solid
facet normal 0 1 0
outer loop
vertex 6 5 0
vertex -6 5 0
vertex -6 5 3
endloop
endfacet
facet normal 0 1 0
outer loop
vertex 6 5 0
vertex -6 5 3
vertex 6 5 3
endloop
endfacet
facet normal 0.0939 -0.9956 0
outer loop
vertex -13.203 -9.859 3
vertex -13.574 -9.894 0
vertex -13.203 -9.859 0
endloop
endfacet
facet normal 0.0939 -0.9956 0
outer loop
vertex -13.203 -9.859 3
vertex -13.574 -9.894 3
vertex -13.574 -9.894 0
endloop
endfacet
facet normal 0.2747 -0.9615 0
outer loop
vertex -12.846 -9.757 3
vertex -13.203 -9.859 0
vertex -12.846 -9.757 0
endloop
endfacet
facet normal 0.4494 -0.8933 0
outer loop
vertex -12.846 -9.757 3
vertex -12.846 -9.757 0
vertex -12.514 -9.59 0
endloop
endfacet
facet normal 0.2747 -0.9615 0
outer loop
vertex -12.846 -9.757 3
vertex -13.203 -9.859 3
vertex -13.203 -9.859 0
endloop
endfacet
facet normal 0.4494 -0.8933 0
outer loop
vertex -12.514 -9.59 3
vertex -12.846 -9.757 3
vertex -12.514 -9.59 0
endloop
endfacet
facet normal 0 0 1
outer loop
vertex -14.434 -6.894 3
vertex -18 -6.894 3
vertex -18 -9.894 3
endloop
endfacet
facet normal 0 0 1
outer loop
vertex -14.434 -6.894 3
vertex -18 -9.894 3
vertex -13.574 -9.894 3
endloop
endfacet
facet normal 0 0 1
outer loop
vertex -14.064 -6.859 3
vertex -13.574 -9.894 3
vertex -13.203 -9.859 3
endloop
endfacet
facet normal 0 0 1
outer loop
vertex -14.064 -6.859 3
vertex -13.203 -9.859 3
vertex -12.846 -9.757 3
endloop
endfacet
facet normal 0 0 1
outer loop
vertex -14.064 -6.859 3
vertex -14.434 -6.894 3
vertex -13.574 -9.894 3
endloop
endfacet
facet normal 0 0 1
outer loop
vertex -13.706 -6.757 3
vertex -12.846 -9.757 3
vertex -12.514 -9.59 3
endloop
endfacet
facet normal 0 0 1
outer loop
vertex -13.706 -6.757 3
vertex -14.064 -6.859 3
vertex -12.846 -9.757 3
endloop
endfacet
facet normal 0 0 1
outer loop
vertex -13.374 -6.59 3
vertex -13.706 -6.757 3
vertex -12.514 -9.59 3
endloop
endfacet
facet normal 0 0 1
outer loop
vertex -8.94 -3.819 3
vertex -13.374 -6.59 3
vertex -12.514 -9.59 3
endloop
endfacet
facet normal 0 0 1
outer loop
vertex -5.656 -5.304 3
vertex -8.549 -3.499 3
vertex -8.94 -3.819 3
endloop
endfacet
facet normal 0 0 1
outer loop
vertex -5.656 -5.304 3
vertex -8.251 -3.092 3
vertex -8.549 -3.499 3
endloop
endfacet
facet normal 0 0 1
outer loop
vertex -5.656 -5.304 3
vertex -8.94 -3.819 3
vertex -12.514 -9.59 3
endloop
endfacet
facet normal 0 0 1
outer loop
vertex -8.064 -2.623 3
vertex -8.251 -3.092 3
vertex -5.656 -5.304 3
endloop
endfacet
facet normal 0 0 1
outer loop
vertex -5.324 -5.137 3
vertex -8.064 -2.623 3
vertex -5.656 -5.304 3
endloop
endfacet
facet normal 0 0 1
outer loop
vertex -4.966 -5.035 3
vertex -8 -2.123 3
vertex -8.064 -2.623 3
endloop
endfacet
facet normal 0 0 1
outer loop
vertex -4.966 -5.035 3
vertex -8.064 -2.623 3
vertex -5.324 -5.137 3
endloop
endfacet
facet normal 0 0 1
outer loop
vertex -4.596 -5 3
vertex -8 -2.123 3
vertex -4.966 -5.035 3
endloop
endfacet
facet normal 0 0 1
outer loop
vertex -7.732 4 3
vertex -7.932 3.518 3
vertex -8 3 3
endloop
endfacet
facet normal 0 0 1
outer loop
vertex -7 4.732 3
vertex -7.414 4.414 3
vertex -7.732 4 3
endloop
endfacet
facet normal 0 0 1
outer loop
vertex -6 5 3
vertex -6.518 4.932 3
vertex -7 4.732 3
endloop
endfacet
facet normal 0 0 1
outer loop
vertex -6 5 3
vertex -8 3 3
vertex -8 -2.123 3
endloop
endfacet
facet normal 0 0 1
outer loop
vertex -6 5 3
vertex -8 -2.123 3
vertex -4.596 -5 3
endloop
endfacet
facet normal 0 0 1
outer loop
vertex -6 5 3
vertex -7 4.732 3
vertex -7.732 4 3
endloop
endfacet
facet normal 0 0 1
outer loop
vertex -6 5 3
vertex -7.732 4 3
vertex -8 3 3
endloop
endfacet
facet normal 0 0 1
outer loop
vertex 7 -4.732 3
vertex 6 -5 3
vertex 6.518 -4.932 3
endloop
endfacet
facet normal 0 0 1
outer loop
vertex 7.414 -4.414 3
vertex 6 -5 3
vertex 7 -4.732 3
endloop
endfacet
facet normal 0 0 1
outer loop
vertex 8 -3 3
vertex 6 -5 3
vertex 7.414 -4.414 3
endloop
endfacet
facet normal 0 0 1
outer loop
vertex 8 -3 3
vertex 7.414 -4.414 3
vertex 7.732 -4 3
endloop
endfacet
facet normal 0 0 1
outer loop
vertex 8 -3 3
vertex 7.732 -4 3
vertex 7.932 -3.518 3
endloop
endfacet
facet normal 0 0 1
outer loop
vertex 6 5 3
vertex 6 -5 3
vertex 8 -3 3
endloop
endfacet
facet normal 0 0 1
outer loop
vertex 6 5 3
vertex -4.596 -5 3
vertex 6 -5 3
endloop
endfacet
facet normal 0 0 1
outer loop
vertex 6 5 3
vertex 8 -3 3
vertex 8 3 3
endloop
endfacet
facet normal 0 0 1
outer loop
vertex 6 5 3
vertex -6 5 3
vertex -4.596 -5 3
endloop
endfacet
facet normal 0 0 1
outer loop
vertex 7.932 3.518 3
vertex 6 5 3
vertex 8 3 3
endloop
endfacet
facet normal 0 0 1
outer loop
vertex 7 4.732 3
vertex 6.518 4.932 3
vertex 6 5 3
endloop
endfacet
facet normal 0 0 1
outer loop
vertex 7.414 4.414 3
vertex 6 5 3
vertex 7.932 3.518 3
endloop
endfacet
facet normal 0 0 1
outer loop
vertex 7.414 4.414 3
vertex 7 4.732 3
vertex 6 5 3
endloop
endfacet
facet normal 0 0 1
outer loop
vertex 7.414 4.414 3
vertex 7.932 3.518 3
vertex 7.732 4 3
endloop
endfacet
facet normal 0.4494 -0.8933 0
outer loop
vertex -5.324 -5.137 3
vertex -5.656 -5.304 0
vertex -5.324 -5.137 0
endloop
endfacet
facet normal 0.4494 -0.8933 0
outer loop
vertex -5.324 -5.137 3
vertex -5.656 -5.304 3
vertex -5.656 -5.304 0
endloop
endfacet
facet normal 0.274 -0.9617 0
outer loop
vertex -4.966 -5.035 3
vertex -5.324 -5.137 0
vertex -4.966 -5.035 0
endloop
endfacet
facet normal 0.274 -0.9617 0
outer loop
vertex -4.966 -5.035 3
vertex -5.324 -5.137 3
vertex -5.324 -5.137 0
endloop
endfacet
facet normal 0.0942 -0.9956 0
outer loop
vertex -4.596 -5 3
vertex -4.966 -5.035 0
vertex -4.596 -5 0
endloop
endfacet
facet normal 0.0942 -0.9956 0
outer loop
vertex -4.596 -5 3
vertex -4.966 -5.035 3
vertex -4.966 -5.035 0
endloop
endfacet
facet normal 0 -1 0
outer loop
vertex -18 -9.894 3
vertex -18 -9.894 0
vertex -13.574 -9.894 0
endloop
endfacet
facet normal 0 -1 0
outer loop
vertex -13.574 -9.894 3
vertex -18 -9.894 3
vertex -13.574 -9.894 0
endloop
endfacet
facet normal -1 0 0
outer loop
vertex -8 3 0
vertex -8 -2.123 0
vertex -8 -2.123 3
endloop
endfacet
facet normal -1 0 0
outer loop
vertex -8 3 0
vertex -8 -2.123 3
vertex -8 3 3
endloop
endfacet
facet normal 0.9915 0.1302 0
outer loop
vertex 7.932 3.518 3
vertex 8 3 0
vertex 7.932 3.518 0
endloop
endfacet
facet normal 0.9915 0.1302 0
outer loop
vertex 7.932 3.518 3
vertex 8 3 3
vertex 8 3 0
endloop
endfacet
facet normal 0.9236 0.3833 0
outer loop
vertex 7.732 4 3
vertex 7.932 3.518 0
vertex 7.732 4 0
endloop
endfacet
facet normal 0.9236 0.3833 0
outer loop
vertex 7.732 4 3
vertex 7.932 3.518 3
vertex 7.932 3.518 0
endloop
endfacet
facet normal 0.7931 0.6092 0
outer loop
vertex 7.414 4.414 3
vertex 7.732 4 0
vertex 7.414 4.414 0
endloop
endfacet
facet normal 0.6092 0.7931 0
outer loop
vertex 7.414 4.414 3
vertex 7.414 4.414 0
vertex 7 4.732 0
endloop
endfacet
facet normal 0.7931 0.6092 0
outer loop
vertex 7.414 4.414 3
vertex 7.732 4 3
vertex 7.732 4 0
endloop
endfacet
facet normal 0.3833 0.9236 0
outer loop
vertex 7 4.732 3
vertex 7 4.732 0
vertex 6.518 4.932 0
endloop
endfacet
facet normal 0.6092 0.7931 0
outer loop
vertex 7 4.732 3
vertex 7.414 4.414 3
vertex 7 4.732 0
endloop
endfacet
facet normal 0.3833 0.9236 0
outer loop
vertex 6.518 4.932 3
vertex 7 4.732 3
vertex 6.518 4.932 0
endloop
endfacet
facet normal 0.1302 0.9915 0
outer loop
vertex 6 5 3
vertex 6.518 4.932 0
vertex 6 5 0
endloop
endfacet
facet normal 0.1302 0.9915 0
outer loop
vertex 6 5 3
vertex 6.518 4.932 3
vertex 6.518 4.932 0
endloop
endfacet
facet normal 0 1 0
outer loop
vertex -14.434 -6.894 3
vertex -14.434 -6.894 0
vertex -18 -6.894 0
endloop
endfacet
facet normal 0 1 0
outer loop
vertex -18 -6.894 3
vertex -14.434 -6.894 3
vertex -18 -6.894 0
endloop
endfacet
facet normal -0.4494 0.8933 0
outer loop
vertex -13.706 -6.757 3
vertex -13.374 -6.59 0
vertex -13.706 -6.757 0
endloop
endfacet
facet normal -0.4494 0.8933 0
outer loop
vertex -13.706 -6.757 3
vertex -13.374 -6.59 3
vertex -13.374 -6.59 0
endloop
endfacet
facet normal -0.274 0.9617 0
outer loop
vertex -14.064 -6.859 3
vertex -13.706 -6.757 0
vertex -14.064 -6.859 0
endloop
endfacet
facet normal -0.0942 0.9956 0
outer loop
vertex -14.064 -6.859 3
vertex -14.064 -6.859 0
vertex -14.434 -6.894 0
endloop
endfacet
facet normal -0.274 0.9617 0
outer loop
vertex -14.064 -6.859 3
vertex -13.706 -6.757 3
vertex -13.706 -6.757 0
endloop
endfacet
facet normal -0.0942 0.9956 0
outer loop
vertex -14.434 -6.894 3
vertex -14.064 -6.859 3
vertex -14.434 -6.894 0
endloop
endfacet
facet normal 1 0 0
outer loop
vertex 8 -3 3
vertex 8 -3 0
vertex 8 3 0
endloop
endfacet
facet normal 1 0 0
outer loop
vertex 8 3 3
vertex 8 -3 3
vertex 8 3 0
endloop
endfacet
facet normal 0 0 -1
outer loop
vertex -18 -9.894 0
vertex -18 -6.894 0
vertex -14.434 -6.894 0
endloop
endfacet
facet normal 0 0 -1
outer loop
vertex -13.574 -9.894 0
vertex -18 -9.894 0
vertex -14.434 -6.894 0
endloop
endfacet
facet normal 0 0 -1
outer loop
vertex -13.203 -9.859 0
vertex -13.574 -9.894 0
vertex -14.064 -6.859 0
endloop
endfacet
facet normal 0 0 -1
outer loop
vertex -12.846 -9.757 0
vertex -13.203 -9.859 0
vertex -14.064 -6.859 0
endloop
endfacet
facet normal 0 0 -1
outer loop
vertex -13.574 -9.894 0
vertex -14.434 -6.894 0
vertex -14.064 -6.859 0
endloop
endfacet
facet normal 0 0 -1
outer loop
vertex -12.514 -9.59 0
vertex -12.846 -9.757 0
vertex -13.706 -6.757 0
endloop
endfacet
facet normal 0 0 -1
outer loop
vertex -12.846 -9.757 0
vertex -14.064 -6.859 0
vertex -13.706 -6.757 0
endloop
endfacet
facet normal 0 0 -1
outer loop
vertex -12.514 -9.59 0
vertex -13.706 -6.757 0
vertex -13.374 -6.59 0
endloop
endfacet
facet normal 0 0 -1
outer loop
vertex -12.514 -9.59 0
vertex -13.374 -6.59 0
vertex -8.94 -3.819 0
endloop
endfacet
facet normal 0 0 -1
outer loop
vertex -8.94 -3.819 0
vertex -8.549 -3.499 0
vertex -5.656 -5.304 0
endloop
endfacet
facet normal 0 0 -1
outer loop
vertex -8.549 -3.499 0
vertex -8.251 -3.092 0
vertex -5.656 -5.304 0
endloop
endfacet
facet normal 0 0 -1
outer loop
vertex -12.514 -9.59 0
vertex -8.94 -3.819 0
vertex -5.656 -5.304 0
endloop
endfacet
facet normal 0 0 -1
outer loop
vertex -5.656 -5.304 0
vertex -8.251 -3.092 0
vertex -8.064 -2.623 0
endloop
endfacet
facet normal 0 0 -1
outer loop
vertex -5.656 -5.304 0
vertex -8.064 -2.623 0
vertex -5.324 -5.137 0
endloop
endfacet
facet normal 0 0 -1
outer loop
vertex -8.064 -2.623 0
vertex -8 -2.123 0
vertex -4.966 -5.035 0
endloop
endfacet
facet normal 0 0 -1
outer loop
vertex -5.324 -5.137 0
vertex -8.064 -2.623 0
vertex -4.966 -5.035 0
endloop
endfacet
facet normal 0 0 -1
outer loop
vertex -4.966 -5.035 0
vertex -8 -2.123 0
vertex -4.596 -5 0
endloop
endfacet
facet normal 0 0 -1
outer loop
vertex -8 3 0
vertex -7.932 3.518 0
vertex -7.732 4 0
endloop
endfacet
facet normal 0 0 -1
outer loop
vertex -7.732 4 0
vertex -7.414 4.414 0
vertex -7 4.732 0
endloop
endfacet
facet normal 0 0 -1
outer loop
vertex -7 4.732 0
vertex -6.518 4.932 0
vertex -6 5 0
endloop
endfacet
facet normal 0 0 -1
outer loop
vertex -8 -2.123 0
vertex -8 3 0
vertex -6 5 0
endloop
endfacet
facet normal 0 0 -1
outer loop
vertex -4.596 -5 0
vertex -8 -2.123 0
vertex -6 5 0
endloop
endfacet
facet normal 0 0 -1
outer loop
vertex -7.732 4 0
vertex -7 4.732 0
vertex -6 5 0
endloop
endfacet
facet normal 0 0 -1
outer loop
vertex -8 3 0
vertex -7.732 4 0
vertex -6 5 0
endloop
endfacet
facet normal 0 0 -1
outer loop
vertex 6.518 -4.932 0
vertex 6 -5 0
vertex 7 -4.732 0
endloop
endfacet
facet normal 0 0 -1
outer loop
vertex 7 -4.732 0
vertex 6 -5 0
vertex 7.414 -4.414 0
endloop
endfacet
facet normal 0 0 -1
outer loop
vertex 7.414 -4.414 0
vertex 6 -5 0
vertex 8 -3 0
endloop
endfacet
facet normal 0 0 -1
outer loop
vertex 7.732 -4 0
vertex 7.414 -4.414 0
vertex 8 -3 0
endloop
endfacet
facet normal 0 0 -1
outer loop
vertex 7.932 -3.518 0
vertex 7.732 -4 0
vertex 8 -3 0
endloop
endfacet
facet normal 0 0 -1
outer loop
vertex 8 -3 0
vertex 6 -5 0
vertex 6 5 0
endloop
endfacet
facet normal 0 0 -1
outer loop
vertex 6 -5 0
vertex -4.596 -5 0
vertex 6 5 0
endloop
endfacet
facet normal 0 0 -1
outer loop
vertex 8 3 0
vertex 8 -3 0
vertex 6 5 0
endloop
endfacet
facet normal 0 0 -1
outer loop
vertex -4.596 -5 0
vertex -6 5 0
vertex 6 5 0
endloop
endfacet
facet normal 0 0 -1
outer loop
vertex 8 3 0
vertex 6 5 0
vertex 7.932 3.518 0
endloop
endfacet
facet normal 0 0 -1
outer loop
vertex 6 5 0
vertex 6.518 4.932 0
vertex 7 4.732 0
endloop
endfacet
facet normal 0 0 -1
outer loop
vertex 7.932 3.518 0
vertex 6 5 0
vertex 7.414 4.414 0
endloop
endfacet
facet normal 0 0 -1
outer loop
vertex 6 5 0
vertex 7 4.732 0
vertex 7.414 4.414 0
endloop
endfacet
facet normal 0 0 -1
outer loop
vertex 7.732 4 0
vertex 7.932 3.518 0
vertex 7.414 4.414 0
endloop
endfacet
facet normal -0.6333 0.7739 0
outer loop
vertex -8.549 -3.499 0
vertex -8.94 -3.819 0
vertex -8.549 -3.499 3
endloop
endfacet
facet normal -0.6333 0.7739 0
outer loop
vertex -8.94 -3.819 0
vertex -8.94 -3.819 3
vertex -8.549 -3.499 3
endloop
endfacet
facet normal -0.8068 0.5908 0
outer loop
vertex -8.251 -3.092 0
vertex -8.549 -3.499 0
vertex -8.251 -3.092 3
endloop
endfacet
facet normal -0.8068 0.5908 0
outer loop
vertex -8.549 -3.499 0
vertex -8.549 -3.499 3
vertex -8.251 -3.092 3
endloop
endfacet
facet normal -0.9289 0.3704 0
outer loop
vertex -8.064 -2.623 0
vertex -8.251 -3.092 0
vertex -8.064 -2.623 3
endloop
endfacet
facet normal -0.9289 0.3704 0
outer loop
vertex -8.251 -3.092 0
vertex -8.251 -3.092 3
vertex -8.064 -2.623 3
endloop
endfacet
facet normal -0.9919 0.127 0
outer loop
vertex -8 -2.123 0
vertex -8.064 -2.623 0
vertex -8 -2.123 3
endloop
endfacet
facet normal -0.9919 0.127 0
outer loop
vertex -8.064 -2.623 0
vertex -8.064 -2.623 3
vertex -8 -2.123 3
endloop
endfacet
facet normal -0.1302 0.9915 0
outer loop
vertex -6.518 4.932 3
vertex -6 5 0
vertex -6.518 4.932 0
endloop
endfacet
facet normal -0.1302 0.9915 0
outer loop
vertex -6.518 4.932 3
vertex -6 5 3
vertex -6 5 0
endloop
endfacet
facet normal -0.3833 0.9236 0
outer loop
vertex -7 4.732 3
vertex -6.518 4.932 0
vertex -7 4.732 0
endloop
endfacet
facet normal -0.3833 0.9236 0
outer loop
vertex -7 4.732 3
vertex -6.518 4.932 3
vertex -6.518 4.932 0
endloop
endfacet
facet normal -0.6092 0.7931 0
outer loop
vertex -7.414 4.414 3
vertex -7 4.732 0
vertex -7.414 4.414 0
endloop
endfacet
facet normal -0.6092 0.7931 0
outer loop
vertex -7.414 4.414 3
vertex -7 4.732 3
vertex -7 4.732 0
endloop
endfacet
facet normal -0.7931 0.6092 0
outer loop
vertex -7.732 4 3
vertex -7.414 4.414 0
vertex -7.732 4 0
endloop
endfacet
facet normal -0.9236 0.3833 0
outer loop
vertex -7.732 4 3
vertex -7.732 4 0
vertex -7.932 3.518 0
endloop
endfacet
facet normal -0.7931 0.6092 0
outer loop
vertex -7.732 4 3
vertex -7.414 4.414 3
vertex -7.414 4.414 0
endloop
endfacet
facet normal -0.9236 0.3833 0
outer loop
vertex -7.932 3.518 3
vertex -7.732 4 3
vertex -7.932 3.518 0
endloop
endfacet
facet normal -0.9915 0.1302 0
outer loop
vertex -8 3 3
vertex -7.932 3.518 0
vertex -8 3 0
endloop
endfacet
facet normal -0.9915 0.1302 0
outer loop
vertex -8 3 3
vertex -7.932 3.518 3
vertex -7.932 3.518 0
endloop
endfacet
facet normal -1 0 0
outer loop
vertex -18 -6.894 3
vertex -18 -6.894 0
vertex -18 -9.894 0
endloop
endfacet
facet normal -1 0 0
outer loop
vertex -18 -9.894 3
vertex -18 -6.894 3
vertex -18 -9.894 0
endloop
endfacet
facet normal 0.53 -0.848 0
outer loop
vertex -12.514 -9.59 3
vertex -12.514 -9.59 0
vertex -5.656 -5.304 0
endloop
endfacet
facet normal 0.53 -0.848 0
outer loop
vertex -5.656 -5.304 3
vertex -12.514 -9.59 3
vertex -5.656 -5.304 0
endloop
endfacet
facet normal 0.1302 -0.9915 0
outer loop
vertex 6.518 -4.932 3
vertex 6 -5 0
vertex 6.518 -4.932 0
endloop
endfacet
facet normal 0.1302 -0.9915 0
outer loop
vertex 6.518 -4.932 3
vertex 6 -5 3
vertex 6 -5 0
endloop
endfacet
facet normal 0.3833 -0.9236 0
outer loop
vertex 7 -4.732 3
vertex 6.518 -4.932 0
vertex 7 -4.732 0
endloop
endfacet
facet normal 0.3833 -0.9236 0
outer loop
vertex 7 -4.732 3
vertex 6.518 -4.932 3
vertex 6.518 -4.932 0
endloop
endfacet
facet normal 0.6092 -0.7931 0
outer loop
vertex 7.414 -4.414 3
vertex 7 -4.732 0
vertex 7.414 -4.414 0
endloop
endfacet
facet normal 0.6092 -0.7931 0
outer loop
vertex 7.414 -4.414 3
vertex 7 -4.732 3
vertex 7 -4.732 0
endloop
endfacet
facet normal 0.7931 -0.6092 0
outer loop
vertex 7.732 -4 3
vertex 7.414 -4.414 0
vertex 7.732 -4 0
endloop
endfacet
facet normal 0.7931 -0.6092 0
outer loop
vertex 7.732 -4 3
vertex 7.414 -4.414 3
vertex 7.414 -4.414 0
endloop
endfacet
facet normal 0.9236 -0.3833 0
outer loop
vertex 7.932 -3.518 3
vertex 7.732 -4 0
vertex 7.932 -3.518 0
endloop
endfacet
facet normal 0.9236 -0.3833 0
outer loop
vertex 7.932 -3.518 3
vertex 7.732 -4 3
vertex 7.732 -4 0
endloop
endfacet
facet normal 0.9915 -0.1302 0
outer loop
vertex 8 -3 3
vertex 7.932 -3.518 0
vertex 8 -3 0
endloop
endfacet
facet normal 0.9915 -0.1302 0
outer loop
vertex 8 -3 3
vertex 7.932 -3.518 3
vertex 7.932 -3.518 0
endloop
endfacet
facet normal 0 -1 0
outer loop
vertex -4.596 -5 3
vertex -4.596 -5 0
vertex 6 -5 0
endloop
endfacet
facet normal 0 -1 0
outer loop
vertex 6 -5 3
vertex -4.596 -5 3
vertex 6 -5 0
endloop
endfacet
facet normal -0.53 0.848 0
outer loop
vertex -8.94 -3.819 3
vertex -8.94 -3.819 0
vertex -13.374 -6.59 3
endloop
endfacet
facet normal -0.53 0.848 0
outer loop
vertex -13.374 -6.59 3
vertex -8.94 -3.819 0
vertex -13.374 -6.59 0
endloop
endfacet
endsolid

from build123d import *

# Parameters (mm, degrees)
SKETCH_1_W      = 16
SKETCH_1_H      = 10
EXTRUDE_1_DEPTH = 3
FILLET_1_R      = 2


with BuildPart() as part:
    # 草图1 → 凸台-拉伸1 (new body)
    with BuildSketch(Plane.XY):
        Polygon((-8, -5), (-8, -3.231128538), (-13.860388679, -6.893871462), (-18, -6.893871462), (-18, -9.893871462), (-13, -9.893871462), (-5.16980566, -5), align=None)
        Rectangle(SKETCH_1_W, SKETCH_1_H)
    extrude(amount=EXTRUDE_1_DEPTH)

    # 圆角1
    fillet_1_edges = [part.edges().sort_by_distance(p)[0] for p in [
        (-13, -9.893871462, 1.5),
        (-13.860388679, -6.893871462, 1.5),
        (-8, -3.231128538, 1.5),
        (-8, 5, 1.5),
        (8, 5, 1.5),
        (8, -5, 1.5),
        (-5.16980566, -5, 1.5),
    ]]
    fillet(fillet_1_edges, radius=FILLET_1_R)


solid = part.part
